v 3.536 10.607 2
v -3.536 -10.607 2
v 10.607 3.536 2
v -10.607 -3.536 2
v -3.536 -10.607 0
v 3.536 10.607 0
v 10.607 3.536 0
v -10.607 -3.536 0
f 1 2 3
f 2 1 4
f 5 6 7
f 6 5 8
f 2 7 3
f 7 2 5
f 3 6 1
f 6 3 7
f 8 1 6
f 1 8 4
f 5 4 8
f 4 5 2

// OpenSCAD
// Auto-generated from tests/data/feature_fixtures_manifest.json
// fixture: plate_rotated_z45_plain
// fixture_type: plate
// description: Plain plate rotated 45 degrees around Z. Extends rotated-plate detection to a steeper angle.
// transform: rotate=[0.000000, 0.000000, 45.000000], translate=[0.000000, 0.000000, 0.000000]
$fn = 96;

plate_size = [20.000000, 10.000000, 2.000000];
plate_origin = [-10.000000, -5.000000, 0.000000];

module through_hole(center, diameter, height) {
  translate(center) cylinder(d=diameter, h=height, center=false);
}

module through_slot(start, end, width, height) {
  hull() {
    through_hole(start, width, height);
    through_hole(end, width, height);
  }
}

module counterbore_hole(center, through_d, bore_d, bore_depth, plate_thickness) {
  translate([center[0], center[1], -0.1])
    cylinder(d=through_d, h=plate_thickness + 0.2, center=false);
  translate([center[0], center[1], plate_thickness - bore_depth])
    cylinder(d=bore_d, h=bore_depth + 0.1, center=false);
}

translate([0.000000, 0.000000, 0.000000])
rotate([0.000000, 0.000000, 45.000000]) {
difference() {
  translate(plate_origin) cube(plate_size);
}
}
